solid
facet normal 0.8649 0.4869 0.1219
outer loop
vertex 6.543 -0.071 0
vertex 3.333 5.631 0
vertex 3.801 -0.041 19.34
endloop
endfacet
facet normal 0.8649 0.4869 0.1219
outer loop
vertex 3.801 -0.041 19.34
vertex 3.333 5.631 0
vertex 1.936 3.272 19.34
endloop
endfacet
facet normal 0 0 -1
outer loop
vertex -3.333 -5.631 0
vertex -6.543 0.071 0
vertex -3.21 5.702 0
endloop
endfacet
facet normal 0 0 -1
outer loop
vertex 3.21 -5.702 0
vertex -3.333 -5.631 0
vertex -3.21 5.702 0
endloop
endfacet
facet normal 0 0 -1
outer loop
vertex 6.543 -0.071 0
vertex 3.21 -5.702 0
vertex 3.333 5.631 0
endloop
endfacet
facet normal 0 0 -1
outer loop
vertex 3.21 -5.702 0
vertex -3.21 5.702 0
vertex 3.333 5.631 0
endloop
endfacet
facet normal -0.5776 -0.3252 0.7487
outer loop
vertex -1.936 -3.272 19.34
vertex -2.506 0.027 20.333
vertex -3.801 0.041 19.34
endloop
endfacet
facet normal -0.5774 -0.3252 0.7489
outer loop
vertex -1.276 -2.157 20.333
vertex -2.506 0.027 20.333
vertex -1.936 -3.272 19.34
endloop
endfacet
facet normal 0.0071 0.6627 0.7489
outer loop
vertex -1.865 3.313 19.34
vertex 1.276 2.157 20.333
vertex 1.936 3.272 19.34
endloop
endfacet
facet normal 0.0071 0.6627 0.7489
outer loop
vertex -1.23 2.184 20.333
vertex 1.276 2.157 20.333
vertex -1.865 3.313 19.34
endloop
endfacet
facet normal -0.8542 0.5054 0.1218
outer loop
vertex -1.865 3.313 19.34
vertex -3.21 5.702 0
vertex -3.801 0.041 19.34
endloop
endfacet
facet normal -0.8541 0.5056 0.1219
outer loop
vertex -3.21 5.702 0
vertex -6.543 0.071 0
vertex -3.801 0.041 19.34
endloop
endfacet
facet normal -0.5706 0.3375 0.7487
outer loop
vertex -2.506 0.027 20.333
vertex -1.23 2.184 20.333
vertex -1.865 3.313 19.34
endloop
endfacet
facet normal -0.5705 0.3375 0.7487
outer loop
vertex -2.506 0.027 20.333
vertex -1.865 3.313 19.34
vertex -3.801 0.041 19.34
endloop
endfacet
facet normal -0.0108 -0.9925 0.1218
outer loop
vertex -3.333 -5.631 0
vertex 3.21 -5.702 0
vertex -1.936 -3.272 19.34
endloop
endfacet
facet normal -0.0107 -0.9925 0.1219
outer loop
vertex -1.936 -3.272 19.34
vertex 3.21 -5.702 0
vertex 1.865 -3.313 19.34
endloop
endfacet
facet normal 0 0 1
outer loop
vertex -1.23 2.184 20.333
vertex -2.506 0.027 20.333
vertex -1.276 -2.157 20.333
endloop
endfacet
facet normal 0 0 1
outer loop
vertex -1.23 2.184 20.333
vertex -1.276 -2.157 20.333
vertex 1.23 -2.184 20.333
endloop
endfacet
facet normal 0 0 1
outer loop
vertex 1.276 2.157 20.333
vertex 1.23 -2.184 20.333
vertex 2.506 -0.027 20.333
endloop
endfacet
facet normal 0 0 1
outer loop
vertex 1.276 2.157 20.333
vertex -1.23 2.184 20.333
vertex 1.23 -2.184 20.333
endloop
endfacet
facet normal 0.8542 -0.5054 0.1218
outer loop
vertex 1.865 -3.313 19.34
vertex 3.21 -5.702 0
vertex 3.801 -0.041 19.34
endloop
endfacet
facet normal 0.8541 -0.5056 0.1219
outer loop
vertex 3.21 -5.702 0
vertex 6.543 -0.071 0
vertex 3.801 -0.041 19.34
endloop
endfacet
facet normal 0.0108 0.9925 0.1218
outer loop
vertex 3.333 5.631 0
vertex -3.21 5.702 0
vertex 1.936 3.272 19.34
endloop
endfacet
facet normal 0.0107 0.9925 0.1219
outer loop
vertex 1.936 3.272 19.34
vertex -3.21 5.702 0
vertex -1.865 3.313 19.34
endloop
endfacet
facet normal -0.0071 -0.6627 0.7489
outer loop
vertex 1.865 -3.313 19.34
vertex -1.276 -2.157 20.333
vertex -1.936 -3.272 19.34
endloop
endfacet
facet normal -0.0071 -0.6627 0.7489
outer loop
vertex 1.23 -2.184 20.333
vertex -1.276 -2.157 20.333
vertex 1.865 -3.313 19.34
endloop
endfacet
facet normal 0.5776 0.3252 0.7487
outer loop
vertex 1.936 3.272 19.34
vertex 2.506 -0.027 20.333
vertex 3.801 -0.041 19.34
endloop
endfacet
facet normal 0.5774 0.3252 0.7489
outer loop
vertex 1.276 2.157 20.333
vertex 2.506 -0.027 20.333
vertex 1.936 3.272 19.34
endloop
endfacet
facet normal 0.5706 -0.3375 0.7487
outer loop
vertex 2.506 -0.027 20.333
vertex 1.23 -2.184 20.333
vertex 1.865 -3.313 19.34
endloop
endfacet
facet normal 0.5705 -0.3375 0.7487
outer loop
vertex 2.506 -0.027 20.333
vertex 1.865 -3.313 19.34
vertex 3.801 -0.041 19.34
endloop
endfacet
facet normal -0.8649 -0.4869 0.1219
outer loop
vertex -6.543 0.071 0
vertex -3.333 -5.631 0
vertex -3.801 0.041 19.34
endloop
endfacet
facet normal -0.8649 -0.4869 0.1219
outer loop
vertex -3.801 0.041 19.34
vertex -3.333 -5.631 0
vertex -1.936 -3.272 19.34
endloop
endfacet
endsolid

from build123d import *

# Parameters (mm, degrees)
F1_DEPTH = 20.3326418996
F1_TAPER = 7
F2_SIZE  = 1


with BuildPart() as f1:
    # F0 (on Top) → F1 (new body)
    with BuildSketch(Plane.XY):
        Polygon((3.2104404383, -5.701944282), (6.5432488184, -0.0706491641), (3.3328083801, 5.6312951179), (-3.2104404383, 5.701944282), (-6.5432488184, 0.0706491641), (-3.3328083801, -5.6312951179), align=None)
    extrude(amount=F1_DEPTH, taper=F1_TAPER)

    # F2
    f2_edges = [f1.edges().sort_by_distance(p)[0] for p in [
        (2.762615, 1.555471, 20.332642),
        (-2.762615, -1.555471, 20.332642),
        (0.03423, 3.170231, 20.332642),
        (-2.728385, 1.614759, 20.332642),
        (-0.03423, -3.170231, 20.332642),
        (2.728385, -1.614759, 20.332642),
    ]]
    chamfer(f2_edges, length=F2_SIZE)


solid = f1.part
